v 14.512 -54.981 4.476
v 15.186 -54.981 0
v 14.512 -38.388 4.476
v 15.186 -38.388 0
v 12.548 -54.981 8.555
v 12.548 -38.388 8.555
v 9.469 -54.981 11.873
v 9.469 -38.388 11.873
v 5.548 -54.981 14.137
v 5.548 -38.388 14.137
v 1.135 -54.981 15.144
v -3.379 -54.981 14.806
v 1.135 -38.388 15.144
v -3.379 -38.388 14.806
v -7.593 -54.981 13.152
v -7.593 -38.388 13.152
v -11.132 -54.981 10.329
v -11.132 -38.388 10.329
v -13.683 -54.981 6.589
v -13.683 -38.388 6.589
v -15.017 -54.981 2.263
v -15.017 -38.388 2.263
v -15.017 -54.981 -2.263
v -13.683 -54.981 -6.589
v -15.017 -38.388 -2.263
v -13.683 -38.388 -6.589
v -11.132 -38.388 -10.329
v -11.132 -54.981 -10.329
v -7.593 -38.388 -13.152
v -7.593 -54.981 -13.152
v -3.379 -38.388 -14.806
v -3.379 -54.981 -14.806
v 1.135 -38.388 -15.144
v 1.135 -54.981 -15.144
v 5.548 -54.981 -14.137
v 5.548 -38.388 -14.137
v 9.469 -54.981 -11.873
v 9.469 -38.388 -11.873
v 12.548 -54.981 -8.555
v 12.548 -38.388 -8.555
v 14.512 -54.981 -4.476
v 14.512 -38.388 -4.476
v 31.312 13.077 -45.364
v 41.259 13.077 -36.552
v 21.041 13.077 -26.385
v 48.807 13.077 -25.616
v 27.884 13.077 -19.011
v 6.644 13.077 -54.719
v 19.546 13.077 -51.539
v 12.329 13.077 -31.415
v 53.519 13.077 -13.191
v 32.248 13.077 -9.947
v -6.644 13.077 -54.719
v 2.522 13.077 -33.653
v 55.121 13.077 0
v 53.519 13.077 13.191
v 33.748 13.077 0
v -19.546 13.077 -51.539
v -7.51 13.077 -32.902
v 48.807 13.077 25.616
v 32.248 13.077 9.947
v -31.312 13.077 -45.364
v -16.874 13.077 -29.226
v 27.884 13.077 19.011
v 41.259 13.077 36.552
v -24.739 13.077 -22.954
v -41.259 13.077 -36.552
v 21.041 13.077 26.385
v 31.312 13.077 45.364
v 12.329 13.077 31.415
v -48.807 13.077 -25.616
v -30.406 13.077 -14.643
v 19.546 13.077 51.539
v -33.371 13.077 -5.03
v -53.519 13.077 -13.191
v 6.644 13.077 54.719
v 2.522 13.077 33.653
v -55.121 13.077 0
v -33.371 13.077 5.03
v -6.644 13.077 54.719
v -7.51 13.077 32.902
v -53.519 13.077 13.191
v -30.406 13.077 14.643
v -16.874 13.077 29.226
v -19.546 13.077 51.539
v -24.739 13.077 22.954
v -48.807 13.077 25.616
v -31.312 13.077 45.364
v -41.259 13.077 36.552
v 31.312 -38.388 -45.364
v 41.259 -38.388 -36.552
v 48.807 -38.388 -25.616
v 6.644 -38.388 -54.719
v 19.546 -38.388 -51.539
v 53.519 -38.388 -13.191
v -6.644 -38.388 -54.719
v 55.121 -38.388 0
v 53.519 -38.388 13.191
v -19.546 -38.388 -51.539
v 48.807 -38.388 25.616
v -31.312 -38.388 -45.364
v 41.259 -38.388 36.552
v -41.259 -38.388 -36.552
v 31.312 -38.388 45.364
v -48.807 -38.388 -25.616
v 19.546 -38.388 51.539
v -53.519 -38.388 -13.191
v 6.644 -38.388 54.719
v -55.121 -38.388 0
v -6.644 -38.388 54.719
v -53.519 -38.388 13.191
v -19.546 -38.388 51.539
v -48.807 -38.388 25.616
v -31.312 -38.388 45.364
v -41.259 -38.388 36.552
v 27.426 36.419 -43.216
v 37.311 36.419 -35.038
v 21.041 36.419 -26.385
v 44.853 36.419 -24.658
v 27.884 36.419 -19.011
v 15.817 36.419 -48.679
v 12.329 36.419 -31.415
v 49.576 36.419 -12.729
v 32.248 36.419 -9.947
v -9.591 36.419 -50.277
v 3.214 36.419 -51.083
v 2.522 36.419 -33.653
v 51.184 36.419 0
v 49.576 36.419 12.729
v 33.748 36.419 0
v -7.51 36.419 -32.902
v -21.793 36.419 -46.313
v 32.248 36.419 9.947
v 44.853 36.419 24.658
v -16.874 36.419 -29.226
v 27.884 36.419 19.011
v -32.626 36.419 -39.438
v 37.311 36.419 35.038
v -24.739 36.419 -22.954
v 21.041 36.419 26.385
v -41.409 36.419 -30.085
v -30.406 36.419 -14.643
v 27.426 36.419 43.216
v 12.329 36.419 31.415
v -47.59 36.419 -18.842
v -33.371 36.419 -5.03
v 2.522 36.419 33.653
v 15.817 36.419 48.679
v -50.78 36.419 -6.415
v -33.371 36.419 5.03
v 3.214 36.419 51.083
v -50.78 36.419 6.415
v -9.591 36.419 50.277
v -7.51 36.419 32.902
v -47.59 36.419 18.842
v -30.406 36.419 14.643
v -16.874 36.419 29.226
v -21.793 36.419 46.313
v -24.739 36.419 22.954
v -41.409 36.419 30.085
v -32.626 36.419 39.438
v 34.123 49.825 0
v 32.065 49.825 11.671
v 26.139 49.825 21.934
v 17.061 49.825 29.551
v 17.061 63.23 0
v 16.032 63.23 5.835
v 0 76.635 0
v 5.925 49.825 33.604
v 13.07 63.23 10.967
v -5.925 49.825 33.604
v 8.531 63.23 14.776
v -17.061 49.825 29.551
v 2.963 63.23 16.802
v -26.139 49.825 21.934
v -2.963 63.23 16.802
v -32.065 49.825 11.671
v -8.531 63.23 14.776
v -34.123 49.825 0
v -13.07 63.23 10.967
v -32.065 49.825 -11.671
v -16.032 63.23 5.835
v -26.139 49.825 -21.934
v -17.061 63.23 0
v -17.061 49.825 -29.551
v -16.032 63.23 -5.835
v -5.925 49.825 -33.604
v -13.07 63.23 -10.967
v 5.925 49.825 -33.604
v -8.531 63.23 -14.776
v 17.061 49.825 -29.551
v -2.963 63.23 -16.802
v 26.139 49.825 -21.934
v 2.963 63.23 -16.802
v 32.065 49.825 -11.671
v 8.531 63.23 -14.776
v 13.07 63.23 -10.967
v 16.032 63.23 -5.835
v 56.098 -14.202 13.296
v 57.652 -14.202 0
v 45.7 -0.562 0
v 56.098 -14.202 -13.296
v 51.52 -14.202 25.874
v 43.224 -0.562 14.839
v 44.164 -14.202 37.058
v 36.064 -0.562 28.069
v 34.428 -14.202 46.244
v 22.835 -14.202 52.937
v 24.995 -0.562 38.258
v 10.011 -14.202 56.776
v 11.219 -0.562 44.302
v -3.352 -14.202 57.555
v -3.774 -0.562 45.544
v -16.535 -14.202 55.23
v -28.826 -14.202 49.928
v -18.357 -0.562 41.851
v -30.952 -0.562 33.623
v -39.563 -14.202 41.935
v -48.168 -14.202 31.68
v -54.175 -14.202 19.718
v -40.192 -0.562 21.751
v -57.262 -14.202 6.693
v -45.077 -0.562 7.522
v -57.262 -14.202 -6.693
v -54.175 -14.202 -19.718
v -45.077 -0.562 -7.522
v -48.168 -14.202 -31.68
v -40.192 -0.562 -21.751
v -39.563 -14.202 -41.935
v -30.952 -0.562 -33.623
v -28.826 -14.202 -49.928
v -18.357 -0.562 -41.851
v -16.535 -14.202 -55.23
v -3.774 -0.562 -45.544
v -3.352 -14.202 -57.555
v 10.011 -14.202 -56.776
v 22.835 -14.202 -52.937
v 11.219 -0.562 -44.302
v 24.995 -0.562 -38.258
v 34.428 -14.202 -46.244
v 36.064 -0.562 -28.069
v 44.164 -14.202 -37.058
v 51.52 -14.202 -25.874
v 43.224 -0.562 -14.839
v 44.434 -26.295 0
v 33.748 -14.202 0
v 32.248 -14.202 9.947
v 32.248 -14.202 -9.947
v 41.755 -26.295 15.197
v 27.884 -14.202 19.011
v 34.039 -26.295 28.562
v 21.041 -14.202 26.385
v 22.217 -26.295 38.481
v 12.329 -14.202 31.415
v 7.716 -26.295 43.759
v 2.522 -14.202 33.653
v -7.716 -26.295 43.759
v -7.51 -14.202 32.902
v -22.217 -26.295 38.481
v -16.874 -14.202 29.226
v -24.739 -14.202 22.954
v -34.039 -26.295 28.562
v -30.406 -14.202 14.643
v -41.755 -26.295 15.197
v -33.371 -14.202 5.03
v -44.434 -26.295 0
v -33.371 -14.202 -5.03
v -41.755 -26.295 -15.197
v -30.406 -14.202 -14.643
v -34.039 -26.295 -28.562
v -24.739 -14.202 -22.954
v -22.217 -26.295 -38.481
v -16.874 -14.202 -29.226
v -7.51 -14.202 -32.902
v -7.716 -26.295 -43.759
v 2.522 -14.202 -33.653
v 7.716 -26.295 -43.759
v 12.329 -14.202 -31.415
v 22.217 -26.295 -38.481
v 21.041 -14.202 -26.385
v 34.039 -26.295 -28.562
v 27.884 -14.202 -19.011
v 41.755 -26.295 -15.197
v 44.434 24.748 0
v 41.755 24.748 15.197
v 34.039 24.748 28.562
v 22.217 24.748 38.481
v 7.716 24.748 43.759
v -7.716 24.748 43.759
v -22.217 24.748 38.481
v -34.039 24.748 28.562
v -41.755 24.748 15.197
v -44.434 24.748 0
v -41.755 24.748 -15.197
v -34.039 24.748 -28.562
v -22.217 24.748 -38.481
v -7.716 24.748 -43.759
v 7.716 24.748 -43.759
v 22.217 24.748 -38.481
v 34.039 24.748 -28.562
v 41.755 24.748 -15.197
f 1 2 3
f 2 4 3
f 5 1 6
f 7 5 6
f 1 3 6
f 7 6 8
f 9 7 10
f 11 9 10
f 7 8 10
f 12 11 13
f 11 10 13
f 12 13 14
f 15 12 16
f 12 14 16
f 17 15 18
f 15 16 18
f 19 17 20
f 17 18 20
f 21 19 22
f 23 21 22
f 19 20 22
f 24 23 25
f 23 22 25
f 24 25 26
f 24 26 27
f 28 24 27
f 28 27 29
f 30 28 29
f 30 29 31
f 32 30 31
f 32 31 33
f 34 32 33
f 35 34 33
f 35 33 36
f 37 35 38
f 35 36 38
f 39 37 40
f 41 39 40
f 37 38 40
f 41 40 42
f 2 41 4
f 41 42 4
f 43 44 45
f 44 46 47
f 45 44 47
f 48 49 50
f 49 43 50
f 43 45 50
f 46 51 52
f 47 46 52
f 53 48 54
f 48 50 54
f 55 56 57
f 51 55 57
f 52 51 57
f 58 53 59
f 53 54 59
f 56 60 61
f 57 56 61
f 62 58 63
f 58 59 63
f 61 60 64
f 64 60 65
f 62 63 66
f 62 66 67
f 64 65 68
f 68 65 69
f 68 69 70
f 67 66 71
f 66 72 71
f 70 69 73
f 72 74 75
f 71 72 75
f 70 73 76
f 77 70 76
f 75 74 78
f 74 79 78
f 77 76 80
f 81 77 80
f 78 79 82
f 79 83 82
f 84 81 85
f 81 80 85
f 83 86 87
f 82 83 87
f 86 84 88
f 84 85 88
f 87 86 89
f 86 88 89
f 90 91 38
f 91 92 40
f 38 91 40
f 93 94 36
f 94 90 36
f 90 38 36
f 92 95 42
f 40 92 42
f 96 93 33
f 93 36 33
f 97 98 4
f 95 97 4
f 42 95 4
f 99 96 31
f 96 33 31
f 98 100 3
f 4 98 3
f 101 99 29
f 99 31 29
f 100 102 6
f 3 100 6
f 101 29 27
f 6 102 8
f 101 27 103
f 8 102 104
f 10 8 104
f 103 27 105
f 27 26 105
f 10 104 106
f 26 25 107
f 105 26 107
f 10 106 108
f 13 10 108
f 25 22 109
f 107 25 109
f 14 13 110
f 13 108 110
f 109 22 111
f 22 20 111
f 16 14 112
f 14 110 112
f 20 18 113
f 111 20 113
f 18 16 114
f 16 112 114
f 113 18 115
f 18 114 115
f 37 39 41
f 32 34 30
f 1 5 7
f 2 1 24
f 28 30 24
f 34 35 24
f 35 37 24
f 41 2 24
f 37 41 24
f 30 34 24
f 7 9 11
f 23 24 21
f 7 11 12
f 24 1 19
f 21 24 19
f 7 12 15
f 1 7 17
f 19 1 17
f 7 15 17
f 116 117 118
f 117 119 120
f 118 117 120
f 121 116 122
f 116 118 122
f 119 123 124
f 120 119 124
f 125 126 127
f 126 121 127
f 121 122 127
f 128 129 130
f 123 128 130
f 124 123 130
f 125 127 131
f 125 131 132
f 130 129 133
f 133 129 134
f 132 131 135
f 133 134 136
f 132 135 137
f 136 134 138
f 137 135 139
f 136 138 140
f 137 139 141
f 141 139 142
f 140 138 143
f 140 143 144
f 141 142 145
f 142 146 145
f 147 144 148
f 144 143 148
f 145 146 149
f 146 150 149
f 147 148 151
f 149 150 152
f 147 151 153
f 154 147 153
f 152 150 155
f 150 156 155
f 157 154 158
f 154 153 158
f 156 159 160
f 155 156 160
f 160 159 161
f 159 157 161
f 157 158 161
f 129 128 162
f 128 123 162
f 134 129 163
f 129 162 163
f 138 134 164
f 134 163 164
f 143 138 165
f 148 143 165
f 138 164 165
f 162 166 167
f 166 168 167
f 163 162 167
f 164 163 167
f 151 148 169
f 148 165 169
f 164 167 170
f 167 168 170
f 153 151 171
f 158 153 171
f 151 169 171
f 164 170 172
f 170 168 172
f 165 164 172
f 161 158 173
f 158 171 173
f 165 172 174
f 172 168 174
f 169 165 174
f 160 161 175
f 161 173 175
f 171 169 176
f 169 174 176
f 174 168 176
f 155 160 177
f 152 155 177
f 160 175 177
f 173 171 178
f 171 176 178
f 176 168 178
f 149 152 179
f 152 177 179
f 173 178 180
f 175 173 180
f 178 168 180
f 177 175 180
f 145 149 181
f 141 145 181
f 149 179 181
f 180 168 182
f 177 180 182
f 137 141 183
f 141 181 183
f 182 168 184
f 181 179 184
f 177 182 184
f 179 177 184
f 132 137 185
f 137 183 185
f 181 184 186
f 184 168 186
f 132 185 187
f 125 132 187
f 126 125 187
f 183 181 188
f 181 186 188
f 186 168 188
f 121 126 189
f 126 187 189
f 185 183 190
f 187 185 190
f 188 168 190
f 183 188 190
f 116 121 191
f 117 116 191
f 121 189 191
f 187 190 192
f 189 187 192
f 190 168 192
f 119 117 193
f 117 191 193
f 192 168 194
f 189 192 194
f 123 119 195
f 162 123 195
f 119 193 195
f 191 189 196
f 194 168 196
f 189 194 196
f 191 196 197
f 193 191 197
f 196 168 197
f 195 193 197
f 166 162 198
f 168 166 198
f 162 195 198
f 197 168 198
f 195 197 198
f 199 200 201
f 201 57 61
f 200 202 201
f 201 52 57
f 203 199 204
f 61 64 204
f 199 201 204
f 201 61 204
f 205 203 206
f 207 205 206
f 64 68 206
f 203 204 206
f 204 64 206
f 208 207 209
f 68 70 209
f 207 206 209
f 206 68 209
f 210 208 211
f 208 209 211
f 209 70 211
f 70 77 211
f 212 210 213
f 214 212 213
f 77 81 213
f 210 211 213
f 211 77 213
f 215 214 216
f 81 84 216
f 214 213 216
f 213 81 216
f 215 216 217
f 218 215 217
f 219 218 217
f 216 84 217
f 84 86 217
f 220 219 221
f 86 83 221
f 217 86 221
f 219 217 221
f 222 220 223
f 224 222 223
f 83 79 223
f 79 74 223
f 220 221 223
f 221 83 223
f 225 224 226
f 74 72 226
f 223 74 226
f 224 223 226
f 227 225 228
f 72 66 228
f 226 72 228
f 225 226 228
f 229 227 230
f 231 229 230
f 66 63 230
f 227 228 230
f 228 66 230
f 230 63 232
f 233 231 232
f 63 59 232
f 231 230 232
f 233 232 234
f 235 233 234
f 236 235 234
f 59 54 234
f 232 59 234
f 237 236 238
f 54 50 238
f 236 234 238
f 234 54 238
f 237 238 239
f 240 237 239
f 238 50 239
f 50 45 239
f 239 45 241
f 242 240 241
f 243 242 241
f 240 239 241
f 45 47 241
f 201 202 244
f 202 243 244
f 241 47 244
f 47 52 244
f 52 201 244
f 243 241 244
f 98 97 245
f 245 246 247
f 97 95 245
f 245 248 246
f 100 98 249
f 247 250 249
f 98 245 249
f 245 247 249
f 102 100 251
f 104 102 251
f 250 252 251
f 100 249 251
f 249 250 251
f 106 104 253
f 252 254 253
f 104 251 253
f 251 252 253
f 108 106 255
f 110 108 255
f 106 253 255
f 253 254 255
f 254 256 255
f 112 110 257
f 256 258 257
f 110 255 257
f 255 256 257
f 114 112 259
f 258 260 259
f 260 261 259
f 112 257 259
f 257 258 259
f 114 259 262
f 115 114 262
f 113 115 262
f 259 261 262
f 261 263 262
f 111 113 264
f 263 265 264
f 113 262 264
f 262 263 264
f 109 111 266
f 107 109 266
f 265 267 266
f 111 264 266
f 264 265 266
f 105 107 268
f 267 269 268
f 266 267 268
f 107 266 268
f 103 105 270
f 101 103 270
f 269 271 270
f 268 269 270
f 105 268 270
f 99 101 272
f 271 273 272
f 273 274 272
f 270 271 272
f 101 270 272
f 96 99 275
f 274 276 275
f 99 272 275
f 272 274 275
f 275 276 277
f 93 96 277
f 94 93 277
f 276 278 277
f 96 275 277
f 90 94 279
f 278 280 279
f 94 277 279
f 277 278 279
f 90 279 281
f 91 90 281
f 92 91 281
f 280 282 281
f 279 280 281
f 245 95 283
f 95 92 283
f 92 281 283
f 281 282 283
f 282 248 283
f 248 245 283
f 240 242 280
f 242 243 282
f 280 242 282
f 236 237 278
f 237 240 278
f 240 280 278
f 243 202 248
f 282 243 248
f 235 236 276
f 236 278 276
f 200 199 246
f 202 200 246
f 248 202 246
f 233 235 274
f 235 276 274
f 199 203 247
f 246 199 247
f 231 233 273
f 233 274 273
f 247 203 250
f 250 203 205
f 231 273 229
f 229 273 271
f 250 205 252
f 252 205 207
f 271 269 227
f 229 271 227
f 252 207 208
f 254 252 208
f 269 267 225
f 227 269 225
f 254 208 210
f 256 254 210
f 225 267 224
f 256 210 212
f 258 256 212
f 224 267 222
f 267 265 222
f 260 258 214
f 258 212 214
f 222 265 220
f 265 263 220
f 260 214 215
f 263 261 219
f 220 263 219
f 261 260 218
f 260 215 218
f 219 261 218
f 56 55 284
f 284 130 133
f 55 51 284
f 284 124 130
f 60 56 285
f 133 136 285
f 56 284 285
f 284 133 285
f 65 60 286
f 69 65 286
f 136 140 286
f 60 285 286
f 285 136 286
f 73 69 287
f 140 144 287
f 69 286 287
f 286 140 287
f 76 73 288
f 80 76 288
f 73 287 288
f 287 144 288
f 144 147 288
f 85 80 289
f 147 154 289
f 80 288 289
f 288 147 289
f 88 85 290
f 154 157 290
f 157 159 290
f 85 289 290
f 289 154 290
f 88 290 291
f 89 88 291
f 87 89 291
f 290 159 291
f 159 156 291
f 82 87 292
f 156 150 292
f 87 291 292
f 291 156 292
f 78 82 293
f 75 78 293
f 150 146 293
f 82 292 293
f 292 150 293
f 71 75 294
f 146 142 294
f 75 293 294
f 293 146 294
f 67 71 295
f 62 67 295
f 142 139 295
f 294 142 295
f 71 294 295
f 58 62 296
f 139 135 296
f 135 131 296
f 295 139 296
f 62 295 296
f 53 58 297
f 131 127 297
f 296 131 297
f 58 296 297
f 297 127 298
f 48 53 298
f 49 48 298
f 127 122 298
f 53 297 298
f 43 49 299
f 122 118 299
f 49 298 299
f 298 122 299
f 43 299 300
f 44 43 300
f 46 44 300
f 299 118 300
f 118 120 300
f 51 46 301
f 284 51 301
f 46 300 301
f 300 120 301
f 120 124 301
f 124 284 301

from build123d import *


with BuildPart() as f1:
    # F0 (on Top) → F1 (revolve)
    with BuildSketch(Plane.XY):
        Polygon((0, 76.635234), (0, -54.980509), (15.186432, -54.980509), (15.186432, -38.387928), (55.121128, -38.387928), (33.747628, -14.202126), (57.652198, -14.202126), (33.747628, 13.077206), (55.121128, 13.077206), (33.747628, 36.419317), (51.183905, 36.419317), align=None)
    revolve(axis=Axis((0, 10.827363, 0), (0, -1, 0)))


solid = f1.part
